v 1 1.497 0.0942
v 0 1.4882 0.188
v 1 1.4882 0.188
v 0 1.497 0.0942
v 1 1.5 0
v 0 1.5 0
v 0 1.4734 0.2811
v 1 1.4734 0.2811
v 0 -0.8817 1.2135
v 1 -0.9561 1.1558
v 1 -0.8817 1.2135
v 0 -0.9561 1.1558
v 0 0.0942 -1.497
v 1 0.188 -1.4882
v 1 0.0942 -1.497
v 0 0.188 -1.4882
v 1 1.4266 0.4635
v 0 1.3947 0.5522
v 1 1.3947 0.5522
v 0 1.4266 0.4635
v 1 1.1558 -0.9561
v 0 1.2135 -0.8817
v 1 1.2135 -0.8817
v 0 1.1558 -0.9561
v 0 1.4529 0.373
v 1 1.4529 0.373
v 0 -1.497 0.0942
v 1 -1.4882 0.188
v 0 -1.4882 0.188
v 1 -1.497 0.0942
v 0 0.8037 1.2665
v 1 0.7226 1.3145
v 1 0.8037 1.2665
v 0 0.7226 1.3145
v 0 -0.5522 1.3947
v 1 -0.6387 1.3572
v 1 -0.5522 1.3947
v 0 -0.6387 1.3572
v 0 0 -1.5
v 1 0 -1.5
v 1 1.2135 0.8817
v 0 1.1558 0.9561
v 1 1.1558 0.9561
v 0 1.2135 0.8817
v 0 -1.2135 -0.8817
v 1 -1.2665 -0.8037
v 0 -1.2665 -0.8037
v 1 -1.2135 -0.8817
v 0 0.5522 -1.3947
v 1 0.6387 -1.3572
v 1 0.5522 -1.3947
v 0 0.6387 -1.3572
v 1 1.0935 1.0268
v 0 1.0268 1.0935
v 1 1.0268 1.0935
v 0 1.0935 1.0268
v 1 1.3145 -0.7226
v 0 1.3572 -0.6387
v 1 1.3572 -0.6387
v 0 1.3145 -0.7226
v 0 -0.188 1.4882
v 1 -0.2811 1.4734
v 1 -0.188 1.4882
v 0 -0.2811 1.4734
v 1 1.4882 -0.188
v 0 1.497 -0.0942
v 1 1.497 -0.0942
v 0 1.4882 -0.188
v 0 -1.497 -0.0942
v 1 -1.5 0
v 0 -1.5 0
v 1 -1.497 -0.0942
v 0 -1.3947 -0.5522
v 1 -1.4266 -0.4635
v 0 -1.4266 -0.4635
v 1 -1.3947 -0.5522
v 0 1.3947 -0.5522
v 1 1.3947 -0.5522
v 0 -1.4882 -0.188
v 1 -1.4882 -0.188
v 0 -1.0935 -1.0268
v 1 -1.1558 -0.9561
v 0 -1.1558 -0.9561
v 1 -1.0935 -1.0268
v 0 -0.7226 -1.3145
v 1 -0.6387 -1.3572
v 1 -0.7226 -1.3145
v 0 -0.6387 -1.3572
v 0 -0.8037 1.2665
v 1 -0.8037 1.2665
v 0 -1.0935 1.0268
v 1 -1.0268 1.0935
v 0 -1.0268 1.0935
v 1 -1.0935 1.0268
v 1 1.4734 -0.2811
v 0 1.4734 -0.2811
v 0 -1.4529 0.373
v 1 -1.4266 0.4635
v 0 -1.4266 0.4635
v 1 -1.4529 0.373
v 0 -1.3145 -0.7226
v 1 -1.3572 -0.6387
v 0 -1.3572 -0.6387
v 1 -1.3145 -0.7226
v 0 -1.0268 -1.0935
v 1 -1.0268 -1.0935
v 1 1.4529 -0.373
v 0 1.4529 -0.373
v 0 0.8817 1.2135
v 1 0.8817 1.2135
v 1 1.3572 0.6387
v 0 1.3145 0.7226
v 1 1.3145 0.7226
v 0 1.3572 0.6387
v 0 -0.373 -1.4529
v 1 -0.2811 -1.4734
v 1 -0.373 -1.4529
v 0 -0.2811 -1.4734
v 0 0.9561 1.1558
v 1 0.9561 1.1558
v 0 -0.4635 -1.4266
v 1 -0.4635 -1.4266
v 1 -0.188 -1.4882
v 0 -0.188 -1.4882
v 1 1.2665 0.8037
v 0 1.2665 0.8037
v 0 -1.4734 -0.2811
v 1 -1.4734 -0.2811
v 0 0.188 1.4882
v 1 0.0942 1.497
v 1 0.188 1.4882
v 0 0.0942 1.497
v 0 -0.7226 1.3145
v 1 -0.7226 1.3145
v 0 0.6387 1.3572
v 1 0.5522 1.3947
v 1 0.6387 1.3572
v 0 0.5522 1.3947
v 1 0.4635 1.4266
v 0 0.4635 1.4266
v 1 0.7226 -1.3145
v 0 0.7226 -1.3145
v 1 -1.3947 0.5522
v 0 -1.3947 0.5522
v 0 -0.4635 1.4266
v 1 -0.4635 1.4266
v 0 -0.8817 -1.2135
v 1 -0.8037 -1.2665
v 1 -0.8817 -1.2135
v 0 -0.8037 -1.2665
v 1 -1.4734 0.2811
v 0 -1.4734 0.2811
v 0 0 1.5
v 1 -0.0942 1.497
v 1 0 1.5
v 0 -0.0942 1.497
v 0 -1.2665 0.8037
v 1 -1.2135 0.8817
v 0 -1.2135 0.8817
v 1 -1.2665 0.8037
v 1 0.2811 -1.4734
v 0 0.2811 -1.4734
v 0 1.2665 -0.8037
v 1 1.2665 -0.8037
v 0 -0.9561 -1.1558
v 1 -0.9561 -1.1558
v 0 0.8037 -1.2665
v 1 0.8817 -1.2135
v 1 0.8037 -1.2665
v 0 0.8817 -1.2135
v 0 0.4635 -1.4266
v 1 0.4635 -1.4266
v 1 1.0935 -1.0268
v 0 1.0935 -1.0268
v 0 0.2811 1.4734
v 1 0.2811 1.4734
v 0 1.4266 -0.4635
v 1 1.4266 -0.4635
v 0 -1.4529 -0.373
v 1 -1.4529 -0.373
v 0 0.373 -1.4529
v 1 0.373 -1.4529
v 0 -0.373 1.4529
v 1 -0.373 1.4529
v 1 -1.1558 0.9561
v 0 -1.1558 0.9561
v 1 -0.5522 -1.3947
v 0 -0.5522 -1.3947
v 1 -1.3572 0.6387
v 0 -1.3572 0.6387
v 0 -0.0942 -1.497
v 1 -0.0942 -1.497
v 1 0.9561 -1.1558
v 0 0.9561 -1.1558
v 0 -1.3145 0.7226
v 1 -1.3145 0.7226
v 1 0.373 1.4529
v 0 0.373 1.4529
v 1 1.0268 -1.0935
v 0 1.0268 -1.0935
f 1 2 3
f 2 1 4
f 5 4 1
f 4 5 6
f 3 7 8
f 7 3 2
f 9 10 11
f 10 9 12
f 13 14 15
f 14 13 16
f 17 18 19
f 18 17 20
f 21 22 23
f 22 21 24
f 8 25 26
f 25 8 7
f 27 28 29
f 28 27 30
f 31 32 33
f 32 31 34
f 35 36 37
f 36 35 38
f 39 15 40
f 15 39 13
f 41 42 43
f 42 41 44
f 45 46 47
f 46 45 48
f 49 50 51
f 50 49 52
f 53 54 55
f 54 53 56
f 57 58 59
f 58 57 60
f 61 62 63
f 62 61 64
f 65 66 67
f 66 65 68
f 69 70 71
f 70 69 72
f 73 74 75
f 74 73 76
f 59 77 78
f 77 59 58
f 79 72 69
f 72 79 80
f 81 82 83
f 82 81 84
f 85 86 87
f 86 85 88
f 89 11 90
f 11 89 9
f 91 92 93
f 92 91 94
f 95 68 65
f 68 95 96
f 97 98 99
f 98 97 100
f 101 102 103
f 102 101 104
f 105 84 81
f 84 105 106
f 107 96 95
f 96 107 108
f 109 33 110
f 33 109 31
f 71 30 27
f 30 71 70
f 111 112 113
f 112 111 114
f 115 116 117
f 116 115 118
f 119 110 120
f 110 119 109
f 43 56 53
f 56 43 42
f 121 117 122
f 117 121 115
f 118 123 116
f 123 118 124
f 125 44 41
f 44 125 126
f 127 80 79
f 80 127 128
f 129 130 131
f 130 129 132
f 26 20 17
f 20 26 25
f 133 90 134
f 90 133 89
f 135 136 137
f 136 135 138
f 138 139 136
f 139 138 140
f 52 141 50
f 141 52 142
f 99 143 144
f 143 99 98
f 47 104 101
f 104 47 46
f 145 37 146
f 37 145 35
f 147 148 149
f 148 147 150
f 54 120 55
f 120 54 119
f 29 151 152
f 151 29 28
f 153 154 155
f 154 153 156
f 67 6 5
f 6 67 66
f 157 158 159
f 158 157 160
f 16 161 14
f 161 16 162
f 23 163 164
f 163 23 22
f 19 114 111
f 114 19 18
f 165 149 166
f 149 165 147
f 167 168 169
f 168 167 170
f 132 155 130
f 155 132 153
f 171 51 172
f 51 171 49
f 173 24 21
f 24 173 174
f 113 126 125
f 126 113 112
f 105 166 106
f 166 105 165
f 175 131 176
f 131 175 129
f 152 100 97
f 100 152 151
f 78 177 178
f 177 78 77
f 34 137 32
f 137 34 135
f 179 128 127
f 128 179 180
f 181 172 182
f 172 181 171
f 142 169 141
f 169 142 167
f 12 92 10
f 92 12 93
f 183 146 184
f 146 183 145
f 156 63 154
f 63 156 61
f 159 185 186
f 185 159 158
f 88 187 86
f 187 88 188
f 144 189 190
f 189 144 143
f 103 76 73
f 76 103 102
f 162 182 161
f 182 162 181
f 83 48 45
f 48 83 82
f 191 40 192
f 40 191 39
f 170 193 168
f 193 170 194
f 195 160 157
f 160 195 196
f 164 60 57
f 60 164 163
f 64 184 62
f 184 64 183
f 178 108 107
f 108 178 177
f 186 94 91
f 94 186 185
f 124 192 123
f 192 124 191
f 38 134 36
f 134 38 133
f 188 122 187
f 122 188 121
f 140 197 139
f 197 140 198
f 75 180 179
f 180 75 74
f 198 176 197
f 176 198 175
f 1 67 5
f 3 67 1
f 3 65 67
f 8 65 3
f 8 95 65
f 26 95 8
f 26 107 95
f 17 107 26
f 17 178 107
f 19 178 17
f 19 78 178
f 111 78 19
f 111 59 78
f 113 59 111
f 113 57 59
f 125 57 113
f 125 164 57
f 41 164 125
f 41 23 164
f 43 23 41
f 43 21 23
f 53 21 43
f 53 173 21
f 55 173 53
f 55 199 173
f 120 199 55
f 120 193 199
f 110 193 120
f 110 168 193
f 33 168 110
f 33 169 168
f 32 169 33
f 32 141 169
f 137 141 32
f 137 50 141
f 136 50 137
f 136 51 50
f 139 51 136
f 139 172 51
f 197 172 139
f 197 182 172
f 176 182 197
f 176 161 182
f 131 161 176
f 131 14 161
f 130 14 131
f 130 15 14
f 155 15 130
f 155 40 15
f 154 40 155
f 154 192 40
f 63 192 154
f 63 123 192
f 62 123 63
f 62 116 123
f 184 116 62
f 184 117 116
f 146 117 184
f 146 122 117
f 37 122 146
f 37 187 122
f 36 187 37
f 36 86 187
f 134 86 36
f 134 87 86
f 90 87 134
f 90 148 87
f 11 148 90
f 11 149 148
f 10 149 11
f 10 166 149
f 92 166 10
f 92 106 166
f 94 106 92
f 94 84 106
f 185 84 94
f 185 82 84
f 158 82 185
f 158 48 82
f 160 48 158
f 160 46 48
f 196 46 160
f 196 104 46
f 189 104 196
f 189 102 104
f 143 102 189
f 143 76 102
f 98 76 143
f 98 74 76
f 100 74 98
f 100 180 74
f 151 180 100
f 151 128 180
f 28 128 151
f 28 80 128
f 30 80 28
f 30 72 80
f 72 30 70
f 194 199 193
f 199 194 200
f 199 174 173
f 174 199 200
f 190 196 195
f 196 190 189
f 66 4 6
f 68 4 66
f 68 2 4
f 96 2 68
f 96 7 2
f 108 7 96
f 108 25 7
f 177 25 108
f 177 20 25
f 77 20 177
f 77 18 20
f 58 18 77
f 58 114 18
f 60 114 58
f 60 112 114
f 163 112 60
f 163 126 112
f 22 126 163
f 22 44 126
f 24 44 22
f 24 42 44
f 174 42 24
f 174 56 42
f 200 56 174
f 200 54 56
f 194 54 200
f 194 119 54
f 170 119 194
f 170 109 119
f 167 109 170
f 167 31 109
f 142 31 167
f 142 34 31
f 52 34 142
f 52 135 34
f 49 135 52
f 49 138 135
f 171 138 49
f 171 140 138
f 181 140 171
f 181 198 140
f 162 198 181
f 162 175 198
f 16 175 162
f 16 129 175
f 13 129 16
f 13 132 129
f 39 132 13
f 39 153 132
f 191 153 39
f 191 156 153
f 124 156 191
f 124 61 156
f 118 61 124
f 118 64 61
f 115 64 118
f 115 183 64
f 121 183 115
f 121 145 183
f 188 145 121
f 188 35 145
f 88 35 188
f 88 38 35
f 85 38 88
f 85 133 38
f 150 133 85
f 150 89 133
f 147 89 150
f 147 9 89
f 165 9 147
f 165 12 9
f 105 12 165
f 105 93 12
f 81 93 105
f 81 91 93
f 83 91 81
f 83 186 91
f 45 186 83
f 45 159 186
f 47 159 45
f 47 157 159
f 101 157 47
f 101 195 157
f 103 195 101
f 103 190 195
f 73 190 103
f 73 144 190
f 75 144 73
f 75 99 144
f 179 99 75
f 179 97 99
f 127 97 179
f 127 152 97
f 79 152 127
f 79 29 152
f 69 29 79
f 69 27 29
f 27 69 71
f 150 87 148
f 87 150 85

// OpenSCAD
// file: standoff.scad
module standoff($h, $d1, $d2) {
    difference() {
        cylinder(h=$h, d=$d1);
        cylinder(h=$h, d=$d2);
    }
}
// file: raspi.scad
include<standoff.scad>;

module raspi(){
    $h=5;
    $d1=5.2;
    $d2=2.8;

    //translate([64,29,0])
    translate([6.2,29.4,0])
    color("green")
    standoff($h,$d1,$d2);

    //translate([-29,11.5,0])
    translate([64.2,29.4,0])
    color("blue")
    standoff($h,$d1,$d2);

    translate([6.2,6.3,0])
    color("pink")
    standoff($h,$d1,$d2);

    translate([64.2,6.3,0])
    color("red")
    standoff($h,$d1,$d2);
}
// main file
include<raspi.scad>;
$fn=100;

module buttom($x, $y, $ws) {
    $ds=1.5;        //boden stärke
    $bx=$x-2*$ws;   //box breite
    $by=$y-2*$ws;   //box tiefe
    $bz=20;         //box höhe

    $ax=12;
    $az=8;

    difference() {
        color("blue")
        cube([$bx, $by, $bz]);
        translate([$ws, $ws, $ds])
        color("red")
        cube([$bx-2*$ws, $by-2*$ws, $bz-$ds]);
        translate([($bx-$ax)/2, 0, $ds])
        cube([$ax, $ws, $az]);
    }
    rotate([90,0,90])
    translate([$by/2,$bz/2,-$ws])
    cylinder(h=2*$ws,d=3);
    rotate([90,0,90])
    translate([$by/2,$bz/2,$bx-$ws])
    cylinder(h=2*$ws,d=3);
}
$ws=2.4;
$ds=1.5;

buttom(150, 100, $ws);

translate([20,30,$ds])
raspi();
